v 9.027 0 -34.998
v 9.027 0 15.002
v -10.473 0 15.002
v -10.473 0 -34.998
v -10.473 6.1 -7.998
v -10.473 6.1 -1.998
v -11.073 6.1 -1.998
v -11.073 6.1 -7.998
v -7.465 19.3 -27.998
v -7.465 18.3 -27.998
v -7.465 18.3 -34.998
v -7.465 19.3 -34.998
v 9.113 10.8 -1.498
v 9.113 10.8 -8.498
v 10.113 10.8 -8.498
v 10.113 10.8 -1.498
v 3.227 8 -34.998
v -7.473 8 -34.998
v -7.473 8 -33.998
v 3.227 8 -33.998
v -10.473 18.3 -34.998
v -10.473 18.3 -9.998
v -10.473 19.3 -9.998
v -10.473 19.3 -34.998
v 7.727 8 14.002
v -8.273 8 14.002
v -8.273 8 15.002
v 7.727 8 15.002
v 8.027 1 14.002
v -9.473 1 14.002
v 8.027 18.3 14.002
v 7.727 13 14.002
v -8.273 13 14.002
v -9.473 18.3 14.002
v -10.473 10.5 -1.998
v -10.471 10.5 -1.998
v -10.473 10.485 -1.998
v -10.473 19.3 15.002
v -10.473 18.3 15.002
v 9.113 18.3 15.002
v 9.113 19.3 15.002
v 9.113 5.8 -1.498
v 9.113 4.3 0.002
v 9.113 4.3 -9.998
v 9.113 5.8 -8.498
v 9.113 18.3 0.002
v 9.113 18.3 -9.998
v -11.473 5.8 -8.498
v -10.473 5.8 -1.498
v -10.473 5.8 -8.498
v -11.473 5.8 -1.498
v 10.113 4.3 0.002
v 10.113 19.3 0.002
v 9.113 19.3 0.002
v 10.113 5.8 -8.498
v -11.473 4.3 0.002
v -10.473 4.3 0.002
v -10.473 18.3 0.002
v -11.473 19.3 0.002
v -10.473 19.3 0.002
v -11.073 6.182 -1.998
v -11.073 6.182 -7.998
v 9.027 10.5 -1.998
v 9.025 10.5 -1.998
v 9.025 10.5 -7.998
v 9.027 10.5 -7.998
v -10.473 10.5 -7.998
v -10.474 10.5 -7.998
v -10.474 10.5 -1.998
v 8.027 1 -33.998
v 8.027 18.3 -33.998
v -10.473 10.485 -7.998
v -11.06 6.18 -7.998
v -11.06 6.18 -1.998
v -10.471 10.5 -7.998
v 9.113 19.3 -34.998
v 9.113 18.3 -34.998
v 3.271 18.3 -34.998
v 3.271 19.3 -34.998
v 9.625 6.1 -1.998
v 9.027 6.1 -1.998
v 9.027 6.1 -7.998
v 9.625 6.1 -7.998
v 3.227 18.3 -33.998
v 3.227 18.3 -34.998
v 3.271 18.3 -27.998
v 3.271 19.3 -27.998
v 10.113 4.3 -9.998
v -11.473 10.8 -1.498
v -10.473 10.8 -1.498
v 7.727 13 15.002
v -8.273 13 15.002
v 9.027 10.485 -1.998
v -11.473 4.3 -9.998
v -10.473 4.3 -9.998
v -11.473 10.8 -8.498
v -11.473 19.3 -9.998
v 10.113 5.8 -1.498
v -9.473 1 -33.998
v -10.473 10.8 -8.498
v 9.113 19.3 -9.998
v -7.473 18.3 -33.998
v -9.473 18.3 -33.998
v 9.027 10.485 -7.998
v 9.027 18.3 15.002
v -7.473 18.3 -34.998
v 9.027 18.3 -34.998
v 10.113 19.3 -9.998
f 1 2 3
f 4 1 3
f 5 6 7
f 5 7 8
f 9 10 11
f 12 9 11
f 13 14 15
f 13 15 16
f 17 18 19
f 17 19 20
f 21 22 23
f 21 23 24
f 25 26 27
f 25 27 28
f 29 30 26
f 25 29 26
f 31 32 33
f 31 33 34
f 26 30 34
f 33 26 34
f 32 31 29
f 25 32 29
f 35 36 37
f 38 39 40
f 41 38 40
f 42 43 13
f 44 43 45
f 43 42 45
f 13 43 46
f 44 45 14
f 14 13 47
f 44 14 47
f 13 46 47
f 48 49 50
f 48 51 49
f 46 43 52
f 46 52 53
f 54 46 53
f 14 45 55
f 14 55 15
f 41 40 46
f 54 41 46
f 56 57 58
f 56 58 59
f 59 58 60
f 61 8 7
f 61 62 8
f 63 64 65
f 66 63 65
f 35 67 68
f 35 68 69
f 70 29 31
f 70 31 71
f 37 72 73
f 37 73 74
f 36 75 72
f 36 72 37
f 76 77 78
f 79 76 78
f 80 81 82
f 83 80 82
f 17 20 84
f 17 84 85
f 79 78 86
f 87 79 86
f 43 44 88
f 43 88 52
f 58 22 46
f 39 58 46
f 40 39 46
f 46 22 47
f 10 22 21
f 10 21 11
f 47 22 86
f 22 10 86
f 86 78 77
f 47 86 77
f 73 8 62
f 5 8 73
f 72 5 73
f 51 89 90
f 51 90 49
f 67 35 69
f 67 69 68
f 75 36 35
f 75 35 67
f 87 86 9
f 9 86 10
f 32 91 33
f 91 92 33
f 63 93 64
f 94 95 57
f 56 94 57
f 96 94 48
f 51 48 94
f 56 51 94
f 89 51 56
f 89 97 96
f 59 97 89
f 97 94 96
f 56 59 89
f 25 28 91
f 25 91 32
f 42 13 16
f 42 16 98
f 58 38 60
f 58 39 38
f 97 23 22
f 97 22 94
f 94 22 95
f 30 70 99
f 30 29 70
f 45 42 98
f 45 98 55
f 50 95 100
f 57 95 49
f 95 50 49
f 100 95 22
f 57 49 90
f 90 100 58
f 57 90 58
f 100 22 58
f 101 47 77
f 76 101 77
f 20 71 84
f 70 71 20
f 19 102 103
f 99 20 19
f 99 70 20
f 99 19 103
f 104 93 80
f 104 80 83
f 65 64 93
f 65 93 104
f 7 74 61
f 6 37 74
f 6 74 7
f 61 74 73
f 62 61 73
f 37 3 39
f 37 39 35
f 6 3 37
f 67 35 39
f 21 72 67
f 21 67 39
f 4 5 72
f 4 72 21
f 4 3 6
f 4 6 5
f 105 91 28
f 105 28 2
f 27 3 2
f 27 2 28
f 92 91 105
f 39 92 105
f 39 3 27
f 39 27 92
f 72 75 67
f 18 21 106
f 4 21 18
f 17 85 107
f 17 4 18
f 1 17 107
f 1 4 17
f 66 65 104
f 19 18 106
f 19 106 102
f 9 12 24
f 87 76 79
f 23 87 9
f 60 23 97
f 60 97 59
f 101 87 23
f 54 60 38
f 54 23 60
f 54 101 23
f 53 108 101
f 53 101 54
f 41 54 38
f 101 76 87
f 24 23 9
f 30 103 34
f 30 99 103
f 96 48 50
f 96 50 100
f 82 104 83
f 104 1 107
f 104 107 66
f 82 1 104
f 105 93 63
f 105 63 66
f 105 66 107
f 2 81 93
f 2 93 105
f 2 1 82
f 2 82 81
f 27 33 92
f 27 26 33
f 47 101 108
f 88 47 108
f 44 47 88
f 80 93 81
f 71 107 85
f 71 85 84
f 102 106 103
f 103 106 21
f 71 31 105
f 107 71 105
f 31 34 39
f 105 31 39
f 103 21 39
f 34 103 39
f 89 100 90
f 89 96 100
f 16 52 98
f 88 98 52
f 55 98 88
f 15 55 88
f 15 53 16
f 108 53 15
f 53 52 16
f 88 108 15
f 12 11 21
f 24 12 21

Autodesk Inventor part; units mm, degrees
ref_plane "YZ Plane" through (0, 0, 0) normal (1, 0, 0) x (0, 1, 0)
sketch "Sketch1" plane through (0, 0, 0) normal (0, 1, 0) x (-1, 0, 0)
  line L0 (-9.0266, 15.0024) -> (10.4734, 15.0024)
  line L1 (10.4734, 15.0024) -> (10.4734, -34.9976)
  line L2 (10.4734, -34.9976) -> (-9.0266, -34.9976)
  line L3 (-9.0266, -34.9976) -> (-9.0266, 15.0024)
  point P0 (0, 0)
  dimension "d0" = 19.5
  dimension "d1" = 50
extrude "Extrusion1" add sketch "Sketch1" along normal blind 1
sketch "Sketch2" plane through (0, 1, 0) normal (0, 1, 0) x (1, 0, 0)
  line L0 (-9.4734, -14.0024) -> (8.0266, -14.0024)
  line L1 (8.0266, -14.0024) -> (8.0266, 33.9976)
  line L2 (8.0266, 33.9976) -> (-9.4734, 33.9976)
  line L3 (-9.4734, 33.9976) -> (-9.4734, -14.0024)
  line L4 (-10.4734, 34.9976) -> (-10.4734, -15.0024) projected
  line L5 (9.0266, -15.0024) -> (9.0266, 34.9976) projected
  line L6 (-10.4734, -15.0024) -> (9.0266, -15.0024) projected
  line L7 (9.0266, 34.9976) -> (-10.4734, 34.9976) projected
  point P0 (0, 0)
  dimension "d4" = 1
  dimension "d5" = 1
  dimension "d6" = 1
  dimension "d7" = 1
extrude "Extrusion2" add sketch "Sketch2" along normal blind 7
sketch "Sketch3" plane through (0, 8, 0) normal (0, 1, 0) x (1, 0, 0)
  line L0 (9.0266, -15.0024) -> (-10.4734, -15.0024) projected
  line L1 (-10.4734, 34.9976) -> (9.0266, 34.9976) projected
  line L2 (-10.4734, -15.0024) -> (9.0266, -15.0024)
  line L3 (9.0266, -15.0024) -> (9.0266, 34.9976)
  line L4 (9.0266, 34.9976) -> (-10.4734, 34.9976)
  line L5 (-10.4734, 34.9976) -> (-10.4734, -15.0024)
  line L6 (-9.4734, 33.9976) -> (-9.4734, -14.0024) projected
  line L7 (8.0266, 33.9976) -> (-9.4734, 33.9976) projected
  line L8 (-9.4734, -14.0024) -> (8.0266, -14.0024)
  line L9 (8.0266, -14.0024) -> (8.0266, 33.9976)
  line L10 (8.0266, 33.9976) -> (-9.4734, 33.9976)
  line L11 (-9.4734, 33.9976) -> (-9.4734, -14.0024)
  line L12 (-9.4734, -14.0024) -> (8.0266, -14.0024) projected
  line L13 (7.7266, -14.0024) -> (-8.2734, -14.0024)
  line L14 (-8.2734, -14.0024) -> (-8.2734, -15.0024)
  line L15 (-8.2734, -15.0024) -> (7.7266, -15.0024)
  line L16 (7.7266, -15.0024) -> (7.7266, -14.0024)
  line L17 (-7.4734, 33.9976) -> (3.2266, 33.9976)
  line L18 (3.2266, 33.9976) -> (3.2266, 34.9976)
  line L19 (3.2266, 34.9976) -> (-7.4734, 34.9976)
  line L20 (-7.4734, 34.9976) -> (-7.4734, 33.9976)
  point P0 (0, 0)
  dimension "d10" = 0.3
  dimension "d11" = 16
  dimension "d12" = 2
  dimension "d13" = 10.7
extrude "Extrusion3" add sketch "Sketch3" along normal blind 10.3 contours L0 L16 L8 L9 L7 L18 L1 L3 | L0 L5 L1 L20 L7 L6 L8 L14
sketch "Sketch4" plane through (0, 18.3, 0) normal (0, 1, 0) x (1, 0, 0)
  line L0 (-10.4734, -15.0024) -> (-10.4734, 34.9976) projected
  line L1 (-10.4734, -15.0024) -> (9.113, -15.0024)
  line L2 (9.113, -15.0024) -> (9.113, 34.9976)
  line L3 (9.113, 34.9976) -> (-10.4734, 34.9976)
  line L4 (-10.4734, 34.9976) -> (-10.4734, -15.0024)
  line L5 (-7.4651, 34.9976) -> (3.2707, 34.9976)
  line L6 (3.2707, 34.9976) -> (3.2707, 27.9976)
  line L7 (3.2707, 27.9976) -> (-7.4651, 27.9976)
  line L8 (-7.4651, 27.9976) -> (-7.4651, 34.9976)
  point P0 (0, 0)
  dimension "d16" = 7
  dimension "d50" = 50
sketch "Sketch5" plane through (-8.2734, 8, 15.0024) normal (1, 0, 0) x (0, 0, -1)
  line L0 (1, 0) -> (1, 10.3) projected
  line L1 (0, 0) -> (0, 10.3) projected
  line L2 (1, 10.3) -> (0, 10.3)
  line L3 (0, 10.3) -> (0, 5)
  line L4 (0, 5) -> (1, 5)
  line L5 (1, 5) -> (1, 10.3)
  point P0 (15.0024, -8)
  dimension "d17" = 5
extrude "Extrusion4" add sketch "Sketch5" along normal blind 17
extrude "Extrusion5" add sketch "Sketch4" along normal blind 1 separate body contours L0 L3 L8 L7 L6 L2 L1
sketch "Sketch6" plane through (9.113, 18.3, 15.0024) normal (1, 0, 0) x (0, 0, -1)
  line L0 (50, 1) -> (0, 1) projected
  line L1 (15, 1) -> (25, 1)
  line L2 (25, 1) -> (25, -14)
  line L3 (25, -14) -> (15, -14)
  line L4 (15, -14) -> (15, 1)
  line L5 (0, 0) -> (0, 1) projected
  point P0 (15.0024, -18.3)
  dimension "d22" = 10
  dimension "d23" = 15
  dimension "d24" = 15
extrude "Extrusion6" add sketch "Sketch6" along normal blind 1 bodies 2
sketch "Sketch7" plane through (-10.4734, 18.3, -34.9976) normal (-1, 0, 0) x (0, 0, 1)
  line L0 (0, 1) -> (50, 1) projected
  line L1 (35, 1) -> (25, 1)
  line L2 (25, 1) -> (25, -14)
  line L3 (25, -14) -> (35, -14)
  line L4 (35, -14) -> (35, 1)
  line L5 (50, 0) -> (50, 1) projected
  point P0 (34.9976, -18.3)
  dimension "d27" = 15
  dimension "d28" = 15
  dimension "d29" = 10
extrude "Extrusion7" add sketch "Sketch7" along normal blind 1 bodies 2
sketch "Sketch8" plane through (-11.4734, 18.3, -34.9976) normal (-1, 0, 0) x (0, 0, 1)
  line L0 (33.5, -12.5) -> (26.5, -12.5)
  line L1 (26.5, -12.5) -> (26.5, -7.5)
  line L2 (26.5, -7.5) -> (33.5, -7.5)
  line L3 (33.5, -7.5) -> (33.5, -12.5)
  line L4 (35, -14) -> (35, 1) projected
  line L5 (25, 1) -> (25, -14) projected
  line L6 (25, -14) -> (35, -14) projected
  point P0 (34.9976, -18.3)
  dimension "d32" = 1.5
  dimension "d33" = 1.5
  dimension "d34" = 5
  dimension "d35" = 1.5
extrude "Extrusion8" cut sketch "Sketch8" against normal blind 25 bodies 2
sketch "Sketch9" plane through (-10.4734, 0, -34.9976) normal (-1, 0, 0) x (0, 0, 1)
  line L0 (33, 6.1) -> (27, 6.1)
  line L1 (27, 6.1) -> (27, 10.5)
  line L2 (27, 10.5) -> (33, 10.5)
  line L3 (33, 10.5) -> (33, 6.1)
  line L4 (33.5, 10.8) -> (33.5, 5.8) projected
  line L5 (26.5, 5.8) -> (26.5, 10.8) projected
  line L6 (33.5, 5.8) -> (26.5, 5.8) projected
  line L7 (26.5, 10.8) -> (33.5, 10.8) projected
  point P0 (34.9976, 0)
  dimension "d38" = 0.5
  dimension "d39" = 0.5
  dimension "d40" = 0.3
  dimension "d41" = 0.3
extrude "Extrusion9" add sketch "Sketch9" along normal blind 0.6 contours L0 L1 L2 L3 bodies 1
ref_plane "Work Plane1" through (-11.0734, 6.1, -7.9976) normal (-0.9908, 0.1351, 0) x (0, 0, 1)
sketch "Sketch10" plane through (-11.0734, 6.1, -7.9976) normal (-0.9908, 0.1351, 0) x (0, 0, 1)
  line L0 (6, 4.4407) -> (6, 0.0811) projected
  line L1 (6, 0.0811) -> (0, 0.0811) projected
  line L2 (6, 4.4407) -> (0, 4.4407)
  line L3 (0, 4.4407) -> (0, 0.0811)
  line L4 (0, 0.0811) -> (6, 0.0811)
  line L5 (6, 0.0811) -> (6, 4.4407)
  point P0 (7.9976, -4.5479)
extrude "Extrusion10" cut sketch "Sketch10" along normal blind 0.6 bodies 1
sketch "Sketch11" plane through (9.0266, 0, 15.0024) normal (1, 0, 0) x (0, 0, -1)
  line L0 (17, 6.1) -> (23, 6.1) projected
  line L1 (17, 10.5) -> (17, 6.1) projected
  line L2 (23, 6.1) -> (17, 6.1)
  line L3 (17, 6.1) -> (17, 10.5)
  line L4 (17, 10.5) -> (23, 10.5)
  line L5 (23, 10.5) -> (23, 6.1)
  point P0 (15.0024, 0)
extrude "Extrusion11" add sketch "Sketch11" along normal blind 0.6 bodies 1
ref_plane "Work Plane2" through (9.6266, 6.1, -1.9976) normal (0.9908, 0.1351, 0) x (0, 0, -1)
sketch "Sketch12" plane through (9.6266, 6.1, -1.9976) normal (0.9908, 0.1351, 0) x (0, 0, -1)
  line L0 (0, 4.4407) -> (6, 4.4407) projected
  line L1 (6, 0) -> (6, 4.3597) projected
  line L2 (0, 4.4407) -> (6, 4.4407)
  line L3 (6, 4.4407) -> (6, 0)
  line L4 (6, 0) -> (0, 0)
  line L5 (0, 0) -> (0, 4.4407)
  point P0 (-1.9976, -4.7434)
extrude "Extrusion12" cut sketch "Sketch12" along normal blind 0.6 bodies 1
properties part number "TCampBox"
